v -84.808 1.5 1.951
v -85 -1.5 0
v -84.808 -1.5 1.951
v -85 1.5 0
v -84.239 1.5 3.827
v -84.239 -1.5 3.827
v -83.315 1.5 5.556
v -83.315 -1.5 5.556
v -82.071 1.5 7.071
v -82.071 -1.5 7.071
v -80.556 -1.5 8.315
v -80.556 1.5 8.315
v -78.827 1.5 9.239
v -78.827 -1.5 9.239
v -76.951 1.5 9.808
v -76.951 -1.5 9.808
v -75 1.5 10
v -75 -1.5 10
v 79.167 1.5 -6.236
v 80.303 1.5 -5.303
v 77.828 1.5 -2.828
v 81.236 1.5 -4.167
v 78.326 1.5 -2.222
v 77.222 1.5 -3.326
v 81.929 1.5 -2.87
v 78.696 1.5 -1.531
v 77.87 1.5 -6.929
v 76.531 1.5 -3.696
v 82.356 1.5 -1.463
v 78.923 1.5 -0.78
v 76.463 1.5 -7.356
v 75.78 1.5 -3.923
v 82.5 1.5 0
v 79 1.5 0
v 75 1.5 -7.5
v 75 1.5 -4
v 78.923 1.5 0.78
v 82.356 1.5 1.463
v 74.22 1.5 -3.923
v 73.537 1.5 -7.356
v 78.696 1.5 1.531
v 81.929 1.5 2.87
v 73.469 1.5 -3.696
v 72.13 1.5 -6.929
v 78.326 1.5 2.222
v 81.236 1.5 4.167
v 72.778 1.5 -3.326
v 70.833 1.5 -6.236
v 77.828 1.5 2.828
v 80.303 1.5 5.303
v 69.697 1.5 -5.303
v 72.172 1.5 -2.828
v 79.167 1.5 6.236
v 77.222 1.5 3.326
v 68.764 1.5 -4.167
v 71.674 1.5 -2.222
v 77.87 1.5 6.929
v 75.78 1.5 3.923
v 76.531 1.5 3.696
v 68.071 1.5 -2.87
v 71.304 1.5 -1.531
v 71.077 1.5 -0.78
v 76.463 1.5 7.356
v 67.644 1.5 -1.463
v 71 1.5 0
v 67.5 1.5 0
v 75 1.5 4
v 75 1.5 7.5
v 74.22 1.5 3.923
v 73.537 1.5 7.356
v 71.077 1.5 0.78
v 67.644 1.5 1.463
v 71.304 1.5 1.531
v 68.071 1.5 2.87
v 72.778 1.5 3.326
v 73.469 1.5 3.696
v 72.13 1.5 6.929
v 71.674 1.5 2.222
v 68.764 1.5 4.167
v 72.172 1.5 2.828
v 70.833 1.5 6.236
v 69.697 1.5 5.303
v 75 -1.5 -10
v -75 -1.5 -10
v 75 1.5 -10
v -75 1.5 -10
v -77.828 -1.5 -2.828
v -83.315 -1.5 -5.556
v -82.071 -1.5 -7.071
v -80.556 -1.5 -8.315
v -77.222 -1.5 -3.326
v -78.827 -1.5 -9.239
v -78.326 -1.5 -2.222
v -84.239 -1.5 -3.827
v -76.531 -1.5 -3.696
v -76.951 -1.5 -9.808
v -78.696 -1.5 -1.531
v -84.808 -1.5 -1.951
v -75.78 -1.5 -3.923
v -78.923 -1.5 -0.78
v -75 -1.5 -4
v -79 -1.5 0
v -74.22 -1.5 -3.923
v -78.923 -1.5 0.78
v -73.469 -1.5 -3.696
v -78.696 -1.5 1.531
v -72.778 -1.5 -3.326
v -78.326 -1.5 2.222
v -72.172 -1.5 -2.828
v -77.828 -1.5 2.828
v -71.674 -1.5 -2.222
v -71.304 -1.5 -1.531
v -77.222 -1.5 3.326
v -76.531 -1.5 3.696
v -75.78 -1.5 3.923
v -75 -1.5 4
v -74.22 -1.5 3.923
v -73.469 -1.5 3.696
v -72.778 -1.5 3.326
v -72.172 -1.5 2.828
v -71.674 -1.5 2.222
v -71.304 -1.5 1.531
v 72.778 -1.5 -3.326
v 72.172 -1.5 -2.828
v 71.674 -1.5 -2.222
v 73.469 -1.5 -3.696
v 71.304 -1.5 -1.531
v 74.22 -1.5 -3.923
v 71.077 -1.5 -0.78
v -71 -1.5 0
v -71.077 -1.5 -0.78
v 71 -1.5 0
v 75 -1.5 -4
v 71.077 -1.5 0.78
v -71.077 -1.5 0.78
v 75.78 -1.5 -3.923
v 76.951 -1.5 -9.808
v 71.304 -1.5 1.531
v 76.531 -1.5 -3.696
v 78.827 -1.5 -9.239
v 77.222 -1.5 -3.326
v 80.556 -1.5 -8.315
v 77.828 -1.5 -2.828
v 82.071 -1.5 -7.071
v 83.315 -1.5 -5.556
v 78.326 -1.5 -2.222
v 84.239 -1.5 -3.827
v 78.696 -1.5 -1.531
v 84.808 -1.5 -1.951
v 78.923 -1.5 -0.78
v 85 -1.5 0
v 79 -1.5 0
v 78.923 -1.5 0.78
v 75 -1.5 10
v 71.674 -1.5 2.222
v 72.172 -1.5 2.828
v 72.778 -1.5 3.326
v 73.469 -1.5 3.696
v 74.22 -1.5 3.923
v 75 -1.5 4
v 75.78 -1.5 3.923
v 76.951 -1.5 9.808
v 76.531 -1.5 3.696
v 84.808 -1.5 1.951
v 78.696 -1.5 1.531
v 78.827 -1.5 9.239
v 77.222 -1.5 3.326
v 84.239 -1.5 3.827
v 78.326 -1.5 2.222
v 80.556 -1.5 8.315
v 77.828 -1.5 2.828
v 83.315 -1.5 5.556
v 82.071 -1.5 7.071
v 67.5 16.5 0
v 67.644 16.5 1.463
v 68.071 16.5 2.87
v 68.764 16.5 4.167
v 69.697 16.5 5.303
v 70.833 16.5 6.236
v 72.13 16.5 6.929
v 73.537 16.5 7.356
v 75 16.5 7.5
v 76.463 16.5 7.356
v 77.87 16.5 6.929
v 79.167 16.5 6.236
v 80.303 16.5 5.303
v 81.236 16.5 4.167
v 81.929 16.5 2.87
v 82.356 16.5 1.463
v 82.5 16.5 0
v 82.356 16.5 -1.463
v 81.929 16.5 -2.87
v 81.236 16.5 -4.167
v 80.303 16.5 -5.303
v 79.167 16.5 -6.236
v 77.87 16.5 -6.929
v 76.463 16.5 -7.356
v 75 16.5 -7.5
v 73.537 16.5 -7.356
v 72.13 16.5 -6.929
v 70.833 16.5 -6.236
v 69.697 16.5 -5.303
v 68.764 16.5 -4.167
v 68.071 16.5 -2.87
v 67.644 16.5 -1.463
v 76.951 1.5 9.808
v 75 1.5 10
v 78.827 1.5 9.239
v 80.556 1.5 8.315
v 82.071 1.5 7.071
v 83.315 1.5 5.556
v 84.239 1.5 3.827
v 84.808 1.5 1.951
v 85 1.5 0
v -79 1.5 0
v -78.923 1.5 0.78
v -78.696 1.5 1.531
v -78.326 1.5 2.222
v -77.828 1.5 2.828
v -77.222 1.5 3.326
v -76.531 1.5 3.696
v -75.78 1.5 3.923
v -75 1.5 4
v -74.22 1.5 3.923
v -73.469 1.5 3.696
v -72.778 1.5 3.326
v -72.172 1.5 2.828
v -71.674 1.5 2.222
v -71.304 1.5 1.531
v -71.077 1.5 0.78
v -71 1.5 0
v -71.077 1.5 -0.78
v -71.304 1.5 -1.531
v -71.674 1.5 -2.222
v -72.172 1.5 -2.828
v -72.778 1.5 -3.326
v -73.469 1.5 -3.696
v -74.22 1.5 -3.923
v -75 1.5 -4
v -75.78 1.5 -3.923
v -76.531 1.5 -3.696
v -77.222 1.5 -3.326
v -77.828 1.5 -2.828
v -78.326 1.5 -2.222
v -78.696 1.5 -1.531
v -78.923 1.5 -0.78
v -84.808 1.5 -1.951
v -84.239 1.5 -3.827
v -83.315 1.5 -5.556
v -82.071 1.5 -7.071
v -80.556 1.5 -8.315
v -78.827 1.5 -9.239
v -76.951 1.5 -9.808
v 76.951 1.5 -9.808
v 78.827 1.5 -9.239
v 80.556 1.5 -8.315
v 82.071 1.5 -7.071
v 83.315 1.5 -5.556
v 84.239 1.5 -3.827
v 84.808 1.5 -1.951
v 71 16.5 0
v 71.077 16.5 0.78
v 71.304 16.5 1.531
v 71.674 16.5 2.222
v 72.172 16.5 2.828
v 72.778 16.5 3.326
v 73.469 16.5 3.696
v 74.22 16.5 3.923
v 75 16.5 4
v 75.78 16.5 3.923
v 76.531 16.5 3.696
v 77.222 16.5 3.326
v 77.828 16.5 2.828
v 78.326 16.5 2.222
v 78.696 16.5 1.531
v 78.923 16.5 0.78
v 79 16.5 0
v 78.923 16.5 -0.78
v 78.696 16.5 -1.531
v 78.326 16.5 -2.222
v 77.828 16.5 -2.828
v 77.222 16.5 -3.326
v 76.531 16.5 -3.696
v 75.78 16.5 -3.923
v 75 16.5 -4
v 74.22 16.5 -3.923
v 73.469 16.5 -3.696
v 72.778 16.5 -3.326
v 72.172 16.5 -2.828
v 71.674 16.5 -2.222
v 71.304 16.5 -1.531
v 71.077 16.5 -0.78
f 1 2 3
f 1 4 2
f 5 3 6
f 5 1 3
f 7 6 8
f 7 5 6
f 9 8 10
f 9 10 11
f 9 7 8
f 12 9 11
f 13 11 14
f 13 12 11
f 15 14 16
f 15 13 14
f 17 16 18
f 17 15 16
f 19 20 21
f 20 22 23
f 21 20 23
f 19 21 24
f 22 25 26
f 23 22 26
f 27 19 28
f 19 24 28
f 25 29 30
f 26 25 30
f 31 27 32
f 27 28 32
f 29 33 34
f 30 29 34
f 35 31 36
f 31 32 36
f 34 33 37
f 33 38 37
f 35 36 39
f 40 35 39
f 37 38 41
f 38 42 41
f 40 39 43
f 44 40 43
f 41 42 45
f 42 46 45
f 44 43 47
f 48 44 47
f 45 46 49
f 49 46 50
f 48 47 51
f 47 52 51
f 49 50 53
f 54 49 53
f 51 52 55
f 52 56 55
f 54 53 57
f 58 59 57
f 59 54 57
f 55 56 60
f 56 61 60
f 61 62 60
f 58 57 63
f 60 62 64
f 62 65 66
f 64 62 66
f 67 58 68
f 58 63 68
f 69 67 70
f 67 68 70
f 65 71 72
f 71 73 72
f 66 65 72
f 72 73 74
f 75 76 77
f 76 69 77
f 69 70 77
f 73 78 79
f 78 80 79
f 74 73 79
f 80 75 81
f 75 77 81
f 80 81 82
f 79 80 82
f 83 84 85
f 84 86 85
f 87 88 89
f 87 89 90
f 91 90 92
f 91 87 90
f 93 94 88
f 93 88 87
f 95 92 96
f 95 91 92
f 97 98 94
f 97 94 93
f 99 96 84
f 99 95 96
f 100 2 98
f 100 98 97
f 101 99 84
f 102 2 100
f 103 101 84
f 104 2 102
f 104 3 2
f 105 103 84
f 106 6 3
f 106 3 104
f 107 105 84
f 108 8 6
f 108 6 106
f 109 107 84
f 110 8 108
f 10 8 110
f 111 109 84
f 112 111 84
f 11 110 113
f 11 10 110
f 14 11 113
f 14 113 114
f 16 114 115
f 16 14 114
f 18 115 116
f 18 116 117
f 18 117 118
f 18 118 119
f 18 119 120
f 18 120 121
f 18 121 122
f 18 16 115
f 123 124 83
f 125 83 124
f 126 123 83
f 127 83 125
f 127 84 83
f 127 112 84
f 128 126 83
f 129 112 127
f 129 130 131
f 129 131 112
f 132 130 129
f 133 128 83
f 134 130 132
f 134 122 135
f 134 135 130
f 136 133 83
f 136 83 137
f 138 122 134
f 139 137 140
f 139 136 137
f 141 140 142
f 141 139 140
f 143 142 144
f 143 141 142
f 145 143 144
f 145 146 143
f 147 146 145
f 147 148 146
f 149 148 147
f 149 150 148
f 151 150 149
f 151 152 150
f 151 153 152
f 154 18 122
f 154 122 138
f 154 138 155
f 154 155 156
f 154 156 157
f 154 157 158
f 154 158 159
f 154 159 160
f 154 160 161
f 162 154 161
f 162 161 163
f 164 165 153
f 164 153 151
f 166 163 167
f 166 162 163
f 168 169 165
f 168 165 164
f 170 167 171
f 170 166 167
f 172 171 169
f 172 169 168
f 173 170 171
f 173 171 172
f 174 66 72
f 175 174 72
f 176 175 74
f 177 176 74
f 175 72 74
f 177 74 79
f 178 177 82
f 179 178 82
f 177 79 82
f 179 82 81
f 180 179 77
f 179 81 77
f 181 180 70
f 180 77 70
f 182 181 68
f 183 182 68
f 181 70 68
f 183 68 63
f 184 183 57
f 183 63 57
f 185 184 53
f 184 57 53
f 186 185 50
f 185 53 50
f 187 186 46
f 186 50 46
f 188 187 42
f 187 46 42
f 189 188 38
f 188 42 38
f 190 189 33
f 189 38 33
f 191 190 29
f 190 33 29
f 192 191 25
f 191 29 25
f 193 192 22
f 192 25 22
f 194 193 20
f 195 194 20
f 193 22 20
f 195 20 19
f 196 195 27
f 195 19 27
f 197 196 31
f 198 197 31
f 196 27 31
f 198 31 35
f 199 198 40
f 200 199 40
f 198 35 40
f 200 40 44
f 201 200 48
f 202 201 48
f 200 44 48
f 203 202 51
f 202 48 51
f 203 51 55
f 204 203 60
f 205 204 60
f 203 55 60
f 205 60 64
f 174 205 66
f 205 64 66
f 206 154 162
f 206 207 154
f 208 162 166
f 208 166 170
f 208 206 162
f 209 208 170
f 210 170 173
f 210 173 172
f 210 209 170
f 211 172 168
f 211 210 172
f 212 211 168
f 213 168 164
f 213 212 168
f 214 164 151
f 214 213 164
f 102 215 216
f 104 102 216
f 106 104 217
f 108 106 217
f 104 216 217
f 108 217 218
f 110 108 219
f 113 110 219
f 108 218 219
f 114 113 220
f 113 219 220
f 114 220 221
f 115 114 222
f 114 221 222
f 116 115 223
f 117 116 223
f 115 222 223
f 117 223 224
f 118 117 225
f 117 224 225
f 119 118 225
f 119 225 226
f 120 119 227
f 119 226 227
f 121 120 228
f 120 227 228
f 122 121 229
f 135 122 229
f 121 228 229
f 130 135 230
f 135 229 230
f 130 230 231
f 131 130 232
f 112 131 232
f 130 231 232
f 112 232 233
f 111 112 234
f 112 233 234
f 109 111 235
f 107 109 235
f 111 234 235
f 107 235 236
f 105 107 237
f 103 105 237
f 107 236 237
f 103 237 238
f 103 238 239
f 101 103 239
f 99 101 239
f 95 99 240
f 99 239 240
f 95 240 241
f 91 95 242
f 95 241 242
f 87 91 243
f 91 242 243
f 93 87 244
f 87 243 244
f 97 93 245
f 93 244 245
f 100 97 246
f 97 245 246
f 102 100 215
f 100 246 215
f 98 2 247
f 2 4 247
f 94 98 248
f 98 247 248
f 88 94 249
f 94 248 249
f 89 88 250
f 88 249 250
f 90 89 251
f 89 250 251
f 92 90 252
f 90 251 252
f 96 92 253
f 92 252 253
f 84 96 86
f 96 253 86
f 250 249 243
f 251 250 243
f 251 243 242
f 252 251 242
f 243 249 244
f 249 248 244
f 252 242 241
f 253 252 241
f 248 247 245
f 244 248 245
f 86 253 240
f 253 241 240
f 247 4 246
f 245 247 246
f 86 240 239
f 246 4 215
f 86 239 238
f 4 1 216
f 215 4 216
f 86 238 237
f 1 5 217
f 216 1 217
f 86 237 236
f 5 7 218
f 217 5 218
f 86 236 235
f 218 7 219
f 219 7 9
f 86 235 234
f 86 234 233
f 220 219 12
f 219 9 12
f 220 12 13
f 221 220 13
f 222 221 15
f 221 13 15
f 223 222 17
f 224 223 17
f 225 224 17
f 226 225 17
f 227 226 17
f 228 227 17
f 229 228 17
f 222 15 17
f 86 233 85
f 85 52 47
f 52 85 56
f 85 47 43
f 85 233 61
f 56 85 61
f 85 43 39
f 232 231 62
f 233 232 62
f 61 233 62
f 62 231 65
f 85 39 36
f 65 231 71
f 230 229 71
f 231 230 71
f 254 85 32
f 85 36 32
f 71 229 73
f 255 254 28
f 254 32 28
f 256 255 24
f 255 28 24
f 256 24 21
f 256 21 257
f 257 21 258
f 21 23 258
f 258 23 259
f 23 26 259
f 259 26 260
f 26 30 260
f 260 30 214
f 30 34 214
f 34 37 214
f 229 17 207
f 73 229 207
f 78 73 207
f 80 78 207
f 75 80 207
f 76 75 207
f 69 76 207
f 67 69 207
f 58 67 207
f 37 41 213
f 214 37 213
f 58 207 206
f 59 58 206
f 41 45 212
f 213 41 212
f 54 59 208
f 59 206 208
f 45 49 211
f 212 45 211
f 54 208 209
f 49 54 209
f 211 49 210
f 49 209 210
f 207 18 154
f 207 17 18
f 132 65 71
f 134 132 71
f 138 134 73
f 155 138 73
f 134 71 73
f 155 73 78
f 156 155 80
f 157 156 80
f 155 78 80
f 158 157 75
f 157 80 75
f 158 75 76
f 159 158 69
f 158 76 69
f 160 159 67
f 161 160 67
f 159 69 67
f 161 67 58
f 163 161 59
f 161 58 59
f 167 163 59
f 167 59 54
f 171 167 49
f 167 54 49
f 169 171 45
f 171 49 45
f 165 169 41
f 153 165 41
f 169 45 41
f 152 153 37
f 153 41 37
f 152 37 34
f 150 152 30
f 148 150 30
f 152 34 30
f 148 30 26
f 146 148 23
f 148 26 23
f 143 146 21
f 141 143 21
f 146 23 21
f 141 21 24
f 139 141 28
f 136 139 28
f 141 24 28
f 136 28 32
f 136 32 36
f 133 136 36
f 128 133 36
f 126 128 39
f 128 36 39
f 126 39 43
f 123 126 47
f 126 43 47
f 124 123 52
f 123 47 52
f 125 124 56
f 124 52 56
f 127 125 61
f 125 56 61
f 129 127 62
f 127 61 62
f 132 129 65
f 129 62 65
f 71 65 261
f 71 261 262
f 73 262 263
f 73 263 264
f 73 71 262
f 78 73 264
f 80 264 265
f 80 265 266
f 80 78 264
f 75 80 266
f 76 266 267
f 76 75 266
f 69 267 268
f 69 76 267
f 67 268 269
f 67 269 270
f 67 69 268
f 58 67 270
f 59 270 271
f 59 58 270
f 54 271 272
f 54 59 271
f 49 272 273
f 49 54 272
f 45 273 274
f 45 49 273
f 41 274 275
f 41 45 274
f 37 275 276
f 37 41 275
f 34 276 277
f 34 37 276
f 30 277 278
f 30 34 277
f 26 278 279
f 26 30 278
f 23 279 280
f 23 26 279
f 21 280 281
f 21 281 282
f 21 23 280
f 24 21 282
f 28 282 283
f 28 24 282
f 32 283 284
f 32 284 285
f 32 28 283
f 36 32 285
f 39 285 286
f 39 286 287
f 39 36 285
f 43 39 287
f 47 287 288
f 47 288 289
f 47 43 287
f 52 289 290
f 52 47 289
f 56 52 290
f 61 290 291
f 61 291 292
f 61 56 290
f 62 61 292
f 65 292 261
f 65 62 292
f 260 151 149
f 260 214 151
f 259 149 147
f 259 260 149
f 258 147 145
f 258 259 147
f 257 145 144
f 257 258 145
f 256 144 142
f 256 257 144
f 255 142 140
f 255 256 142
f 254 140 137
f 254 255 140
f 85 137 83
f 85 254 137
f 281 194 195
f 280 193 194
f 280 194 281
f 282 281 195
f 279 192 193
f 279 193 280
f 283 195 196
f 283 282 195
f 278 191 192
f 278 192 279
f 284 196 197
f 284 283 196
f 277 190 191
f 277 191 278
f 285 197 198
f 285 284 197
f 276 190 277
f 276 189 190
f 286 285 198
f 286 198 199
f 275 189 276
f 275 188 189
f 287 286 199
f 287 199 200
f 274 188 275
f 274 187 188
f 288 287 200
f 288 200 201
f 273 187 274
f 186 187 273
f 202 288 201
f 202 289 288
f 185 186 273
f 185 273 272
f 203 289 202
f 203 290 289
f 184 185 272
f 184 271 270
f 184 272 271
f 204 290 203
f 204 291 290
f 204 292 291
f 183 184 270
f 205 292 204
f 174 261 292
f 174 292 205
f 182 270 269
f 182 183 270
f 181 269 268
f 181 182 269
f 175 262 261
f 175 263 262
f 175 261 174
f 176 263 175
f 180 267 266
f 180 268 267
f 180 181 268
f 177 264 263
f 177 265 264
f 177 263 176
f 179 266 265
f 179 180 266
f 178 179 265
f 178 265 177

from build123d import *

# Parameters (mm, degrees)
F0_W     = 170
F0_H     = 3
F1_DEPTH = 10
F2_R     = 9.99999
F3_R     = 4
F4_DEPTH = 3
F5_R     = 7.5
F5_R_2   = 4
F6_DEPTH = 15


# Not quite as in the source:
# - a fillet or chamfer is up to 0.001 mm smaller than in the source, because OpenCascade refuses the exact size


with BuildPart() as f1:
    # F0 (on Top) → F1 (new body, symmetric)
    with BuildSketch(Plane.XY):
        Rectangle(F0_W, F0_H)
    extrude(amount=F1_DEPTH, both=True)

    # F2 (radius 10 in the source; OpenCascade refuses exactly that, so slightly less here)
    f2_edges = [f1.edges().sort_by_distance(p)[0] for p in [
        (-85, 0, 10),
        (-85, 0, -10),
        (85, 0, 10),
        (85, 0, -10),
    ]]
    fillet(f2_edges, radius=F2_R)

    # F3 (on face) → F4 (cut, through all)
    with BuildSketch(Plane(origin=(0, 1.5, 0), x_dir=(-1, 0, 0), z_dir=(0, 1, 0))):
        with Locations((-75, 0)):
            Circle(F3_R)
        with Locations((75, 0)):
            Circle(F3_R)
    extrude(amount=-F4_DEPTH, mode=Mode.SUBTRACT)


with BuildPart() as f6:
    # F5 (on face) → F6 (new body)
    with BuildSketch(Plane(origin=(0, 1.5, 0), x_dir=(-1, 0, 0), z_dir=(0, 1, 0))):
        with Locations((-75, 0)):
            Circle(F5_R)
        with Locations((-75, 0)):
            Circle(F5_R_2, mode=Mode.SUBTRACT)
    extrude(amount=F6_DEPTH)


solid = Compound([f1.part, f6.part])
